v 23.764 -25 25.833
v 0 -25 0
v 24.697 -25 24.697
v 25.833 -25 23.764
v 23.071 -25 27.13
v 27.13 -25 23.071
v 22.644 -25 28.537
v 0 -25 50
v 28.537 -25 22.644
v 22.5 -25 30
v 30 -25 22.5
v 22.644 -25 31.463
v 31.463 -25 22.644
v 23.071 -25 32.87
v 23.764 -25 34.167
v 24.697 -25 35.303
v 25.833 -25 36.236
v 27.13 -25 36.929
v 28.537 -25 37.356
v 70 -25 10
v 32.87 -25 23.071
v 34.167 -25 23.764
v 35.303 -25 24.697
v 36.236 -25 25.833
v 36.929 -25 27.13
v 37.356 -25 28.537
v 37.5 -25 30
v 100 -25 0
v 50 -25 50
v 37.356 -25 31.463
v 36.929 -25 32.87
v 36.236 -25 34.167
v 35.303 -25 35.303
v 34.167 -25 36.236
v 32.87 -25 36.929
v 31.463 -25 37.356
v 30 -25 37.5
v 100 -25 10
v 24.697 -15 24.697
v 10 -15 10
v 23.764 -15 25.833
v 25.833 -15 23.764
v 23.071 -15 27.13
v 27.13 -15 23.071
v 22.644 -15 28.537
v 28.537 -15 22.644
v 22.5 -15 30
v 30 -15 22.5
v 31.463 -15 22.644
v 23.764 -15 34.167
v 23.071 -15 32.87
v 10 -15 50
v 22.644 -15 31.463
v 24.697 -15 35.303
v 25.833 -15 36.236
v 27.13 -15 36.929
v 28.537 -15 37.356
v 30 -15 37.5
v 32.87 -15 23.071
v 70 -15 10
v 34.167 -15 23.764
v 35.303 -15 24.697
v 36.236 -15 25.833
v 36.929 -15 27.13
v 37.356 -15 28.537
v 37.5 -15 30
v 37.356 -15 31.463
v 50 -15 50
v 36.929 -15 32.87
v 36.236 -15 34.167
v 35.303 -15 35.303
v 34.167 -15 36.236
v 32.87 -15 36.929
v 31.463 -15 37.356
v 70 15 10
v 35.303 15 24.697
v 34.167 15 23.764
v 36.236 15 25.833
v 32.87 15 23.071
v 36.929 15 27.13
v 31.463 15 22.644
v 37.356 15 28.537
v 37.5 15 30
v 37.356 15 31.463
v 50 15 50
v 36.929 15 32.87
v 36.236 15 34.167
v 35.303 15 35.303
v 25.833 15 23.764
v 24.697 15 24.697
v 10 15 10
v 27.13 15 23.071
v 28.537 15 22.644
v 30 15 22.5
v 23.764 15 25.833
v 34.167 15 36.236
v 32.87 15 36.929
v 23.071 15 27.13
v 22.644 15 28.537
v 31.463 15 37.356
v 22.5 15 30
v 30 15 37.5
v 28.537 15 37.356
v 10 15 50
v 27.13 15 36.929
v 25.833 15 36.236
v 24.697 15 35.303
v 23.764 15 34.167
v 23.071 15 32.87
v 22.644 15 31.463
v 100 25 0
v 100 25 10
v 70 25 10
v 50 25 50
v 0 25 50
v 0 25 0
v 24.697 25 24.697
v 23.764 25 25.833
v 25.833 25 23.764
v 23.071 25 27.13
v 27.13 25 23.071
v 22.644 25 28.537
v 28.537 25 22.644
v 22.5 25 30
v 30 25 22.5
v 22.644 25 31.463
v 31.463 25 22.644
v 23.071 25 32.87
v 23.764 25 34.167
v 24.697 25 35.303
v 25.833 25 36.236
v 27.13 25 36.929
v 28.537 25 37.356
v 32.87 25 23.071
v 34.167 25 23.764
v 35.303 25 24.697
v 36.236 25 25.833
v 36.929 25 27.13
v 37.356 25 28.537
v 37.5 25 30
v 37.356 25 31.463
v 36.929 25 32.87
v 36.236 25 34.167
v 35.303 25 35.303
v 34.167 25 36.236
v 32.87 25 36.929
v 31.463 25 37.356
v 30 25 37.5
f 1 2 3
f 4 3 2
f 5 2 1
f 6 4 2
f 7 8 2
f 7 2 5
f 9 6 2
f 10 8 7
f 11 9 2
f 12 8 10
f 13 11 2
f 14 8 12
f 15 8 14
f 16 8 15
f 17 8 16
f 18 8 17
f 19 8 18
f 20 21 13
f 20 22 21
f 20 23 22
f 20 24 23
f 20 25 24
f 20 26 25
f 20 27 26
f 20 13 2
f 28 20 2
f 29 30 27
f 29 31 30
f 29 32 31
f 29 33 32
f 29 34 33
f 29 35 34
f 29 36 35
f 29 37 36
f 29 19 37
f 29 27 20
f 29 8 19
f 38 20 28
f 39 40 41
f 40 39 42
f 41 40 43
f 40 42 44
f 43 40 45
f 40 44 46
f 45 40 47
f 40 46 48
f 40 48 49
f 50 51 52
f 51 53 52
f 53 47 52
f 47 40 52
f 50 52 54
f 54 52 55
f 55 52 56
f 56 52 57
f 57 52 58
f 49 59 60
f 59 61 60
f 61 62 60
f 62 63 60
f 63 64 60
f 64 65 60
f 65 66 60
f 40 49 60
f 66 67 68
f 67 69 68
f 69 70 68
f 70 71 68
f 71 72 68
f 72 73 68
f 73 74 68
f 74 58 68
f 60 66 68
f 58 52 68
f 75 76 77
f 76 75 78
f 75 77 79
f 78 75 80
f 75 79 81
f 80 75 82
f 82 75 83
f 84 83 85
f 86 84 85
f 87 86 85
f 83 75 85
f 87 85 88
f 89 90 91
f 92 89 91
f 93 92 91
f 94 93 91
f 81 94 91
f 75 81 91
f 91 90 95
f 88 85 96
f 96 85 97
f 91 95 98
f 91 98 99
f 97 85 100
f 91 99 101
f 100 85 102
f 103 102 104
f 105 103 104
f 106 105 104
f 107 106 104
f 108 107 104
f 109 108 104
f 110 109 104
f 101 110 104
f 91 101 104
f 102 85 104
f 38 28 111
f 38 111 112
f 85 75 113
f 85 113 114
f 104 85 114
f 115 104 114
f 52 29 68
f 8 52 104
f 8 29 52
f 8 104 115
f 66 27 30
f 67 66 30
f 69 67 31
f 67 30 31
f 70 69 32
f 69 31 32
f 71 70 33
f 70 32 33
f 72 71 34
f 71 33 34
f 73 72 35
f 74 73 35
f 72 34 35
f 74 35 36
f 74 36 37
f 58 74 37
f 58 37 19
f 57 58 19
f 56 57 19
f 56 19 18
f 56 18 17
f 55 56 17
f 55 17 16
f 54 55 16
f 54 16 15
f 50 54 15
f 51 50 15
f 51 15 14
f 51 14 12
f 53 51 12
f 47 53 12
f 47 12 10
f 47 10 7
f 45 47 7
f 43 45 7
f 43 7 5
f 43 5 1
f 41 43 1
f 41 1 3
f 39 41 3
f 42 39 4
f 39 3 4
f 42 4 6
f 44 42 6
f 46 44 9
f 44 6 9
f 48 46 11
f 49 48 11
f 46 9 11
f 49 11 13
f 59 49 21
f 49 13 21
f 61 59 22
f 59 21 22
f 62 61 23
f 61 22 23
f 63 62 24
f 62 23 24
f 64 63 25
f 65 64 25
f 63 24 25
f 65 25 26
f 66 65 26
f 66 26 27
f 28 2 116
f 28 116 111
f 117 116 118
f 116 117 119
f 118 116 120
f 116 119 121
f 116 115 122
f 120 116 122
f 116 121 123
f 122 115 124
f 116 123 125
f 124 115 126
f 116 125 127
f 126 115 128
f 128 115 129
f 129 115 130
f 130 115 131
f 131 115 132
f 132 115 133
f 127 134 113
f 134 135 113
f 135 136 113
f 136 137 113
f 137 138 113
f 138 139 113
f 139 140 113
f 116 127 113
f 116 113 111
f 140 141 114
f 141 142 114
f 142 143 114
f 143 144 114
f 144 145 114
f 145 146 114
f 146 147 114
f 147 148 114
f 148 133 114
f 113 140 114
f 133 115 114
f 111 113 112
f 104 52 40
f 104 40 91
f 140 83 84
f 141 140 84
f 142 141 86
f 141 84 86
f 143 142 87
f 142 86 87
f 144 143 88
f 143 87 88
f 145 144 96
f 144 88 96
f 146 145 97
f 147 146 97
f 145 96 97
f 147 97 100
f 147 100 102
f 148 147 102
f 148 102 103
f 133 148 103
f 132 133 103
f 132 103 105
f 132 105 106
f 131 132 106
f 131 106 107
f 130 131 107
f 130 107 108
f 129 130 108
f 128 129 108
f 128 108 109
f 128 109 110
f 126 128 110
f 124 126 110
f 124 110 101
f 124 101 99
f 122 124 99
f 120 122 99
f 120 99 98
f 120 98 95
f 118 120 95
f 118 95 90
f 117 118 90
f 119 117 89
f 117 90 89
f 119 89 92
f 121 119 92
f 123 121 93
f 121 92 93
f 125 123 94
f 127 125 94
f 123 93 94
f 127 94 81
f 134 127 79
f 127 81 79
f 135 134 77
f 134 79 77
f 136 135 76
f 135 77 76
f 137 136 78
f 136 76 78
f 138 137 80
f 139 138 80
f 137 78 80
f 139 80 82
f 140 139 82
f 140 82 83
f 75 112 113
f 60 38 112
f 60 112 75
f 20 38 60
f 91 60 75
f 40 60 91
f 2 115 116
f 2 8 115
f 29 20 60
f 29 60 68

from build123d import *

# Parameters (mm, degrees)
F1_DEPTH = 25
F2_W     = 20
F2_H     = 30
F2_W_2   = 40
F3_DEPTH = 40
F4_R     = 7.5
F5_DEPTH = 50.001


with BuildPart() as f1:
    # F0 (on Front) → F1 (new body, symmetric)
    with BuildSketch(Plane.XZ):
        Polygon((0, 50), (0, 0), (100, 0), (100, 10), (70, 10), (50, 50), align=None)
    extrude(amount=F1_DEPTH, both=True)

    # F2 (on face) → F3 (cut, through all)
    with BuildSketch(Plane.XY.offset(50)):
        with Locations((60, 0)):
            Rectangle(F2_W, F2_H)
        with Locations((30, 0)):
            Rectangle(F2_W_2, F2_H)
    extrude(amount=-F3_DEPTH, mode=Mode.SUBTRACT)

    # F4 (on face) → F5 (cut, through all)
    with BuildSketch(Plane.XZ.offset(25)):
        with Locations((30, 30)):
            Circle(F4_R)
    extrude(amount=-F5_DEPTH, mode=Mode.SUBTRACT)


solid = f1.part
